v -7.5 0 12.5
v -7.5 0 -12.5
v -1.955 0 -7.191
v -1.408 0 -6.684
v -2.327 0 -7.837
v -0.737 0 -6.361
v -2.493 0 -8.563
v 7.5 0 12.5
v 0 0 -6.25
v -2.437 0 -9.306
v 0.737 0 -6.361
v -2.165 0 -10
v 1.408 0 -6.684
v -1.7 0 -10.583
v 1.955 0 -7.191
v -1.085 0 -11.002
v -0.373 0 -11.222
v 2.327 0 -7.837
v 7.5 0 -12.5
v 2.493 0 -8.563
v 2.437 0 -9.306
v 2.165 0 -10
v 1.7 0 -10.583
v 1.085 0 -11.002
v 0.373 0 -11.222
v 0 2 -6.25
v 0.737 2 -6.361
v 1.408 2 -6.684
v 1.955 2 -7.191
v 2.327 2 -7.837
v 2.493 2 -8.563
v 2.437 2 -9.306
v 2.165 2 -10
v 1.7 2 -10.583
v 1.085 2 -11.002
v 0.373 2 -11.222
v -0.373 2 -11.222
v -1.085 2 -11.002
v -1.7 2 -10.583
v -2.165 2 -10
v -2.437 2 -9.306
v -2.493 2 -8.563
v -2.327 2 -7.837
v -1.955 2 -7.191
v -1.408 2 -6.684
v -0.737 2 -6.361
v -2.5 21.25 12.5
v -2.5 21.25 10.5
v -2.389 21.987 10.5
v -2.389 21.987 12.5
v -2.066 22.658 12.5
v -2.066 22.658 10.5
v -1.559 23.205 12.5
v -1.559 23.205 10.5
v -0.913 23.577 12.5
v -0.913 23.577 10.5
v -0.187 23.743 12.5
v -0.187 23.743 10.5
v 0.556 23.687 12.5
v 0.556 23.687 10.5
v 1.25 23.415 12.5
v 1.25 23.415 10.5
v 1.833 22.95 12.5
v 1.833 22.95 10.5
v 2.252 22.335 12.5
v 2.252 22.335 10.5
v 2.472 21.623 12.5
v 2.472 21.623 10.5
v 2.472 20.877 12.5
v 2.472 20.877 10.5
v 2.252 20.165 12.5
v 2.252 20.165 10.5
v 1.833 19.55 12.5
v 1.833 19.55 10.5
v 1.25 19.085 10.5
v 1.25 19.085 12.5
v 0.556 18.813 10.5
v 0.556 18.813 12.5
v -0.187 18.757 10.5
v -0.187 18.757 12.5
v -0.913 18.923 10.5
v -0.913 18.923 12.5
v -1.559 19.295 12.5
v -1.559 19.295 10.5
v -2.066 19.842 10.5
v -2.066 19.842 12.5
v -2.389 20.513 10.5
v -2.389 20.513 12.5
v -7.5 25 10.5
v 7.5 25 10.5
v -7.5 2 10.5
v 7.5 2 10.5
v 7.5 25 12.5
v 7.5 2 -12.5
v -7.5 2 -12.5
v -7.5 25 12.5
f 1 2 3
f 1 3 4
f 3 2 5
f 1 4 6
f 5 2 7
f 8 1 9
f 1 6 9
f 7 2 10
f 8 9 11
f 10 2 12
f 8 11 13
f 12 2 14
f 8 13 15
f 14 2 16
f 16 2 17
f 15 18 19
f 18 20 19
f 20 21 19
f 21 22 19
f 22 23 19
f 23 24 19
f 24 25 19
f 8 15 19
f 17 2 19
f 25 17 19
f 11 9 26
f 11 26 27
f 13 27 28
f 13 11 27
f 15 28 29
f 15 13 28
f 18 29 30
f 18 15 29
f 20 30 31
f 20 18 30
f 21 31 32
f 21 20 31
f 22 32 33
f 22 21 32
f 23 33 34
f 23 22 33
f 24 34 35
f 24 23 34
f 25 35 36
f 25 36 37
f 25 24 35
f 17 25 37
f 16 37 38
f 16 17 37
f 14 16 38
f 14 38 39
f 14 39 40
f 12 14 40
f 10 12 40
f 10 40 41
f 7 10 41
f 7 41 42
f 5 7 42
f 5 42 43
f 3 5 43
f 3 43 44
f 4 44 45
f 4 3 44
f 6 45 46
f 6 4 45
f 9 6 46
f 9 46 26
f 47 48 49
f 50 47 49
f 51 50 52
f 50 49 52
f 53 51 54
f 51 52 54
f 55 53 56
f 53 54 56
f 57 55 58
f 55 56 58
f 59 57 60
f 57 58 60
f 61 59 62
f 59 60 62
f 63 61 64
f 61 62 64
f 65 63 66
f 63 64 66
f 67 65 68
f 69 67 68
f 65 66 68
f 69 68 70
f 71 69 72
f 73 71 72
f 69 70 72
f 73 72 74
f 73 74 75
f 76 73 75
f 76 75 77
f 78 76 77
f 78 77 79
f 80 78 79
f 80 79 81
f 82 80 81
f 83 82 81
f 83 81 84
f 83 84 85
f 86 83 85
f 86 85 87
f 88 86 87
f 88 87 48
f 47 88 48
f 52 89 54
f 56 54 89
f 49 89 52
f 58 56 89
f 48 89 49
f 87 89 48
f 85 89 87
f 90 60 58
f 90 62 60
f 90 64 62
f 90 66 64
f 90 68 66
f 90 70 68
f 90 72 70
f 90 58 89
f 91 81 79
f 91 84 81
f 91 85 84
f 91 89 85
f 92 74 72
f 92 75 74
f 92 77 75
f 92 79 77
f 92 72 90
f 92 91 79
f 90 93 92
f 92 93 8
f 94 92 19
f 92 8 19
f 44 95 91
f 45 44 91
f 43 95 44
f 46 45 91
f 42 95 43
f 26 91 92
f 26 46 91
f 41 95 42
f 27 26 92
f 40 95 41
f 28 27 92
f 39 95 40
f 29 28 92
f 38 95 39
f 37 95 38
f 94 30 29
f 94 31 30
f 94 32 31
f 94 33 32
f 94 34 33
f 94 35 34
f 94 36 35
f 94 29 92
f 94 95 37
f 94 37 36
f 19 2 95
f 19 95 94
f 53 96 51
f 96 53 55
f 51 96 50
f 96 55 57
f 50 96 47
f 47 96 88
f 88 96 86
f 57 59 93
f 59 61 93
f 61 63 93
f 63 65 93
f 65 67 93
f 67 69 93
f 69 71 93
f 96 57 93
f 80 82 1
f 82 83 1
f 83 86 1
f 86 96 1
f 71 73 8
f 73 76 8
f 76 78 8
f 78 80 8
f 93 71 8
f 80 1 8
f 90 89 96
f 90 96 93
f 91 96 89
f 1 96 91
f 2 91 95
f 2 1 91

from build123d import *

# Parameters (mm, degrees)
IZIM1_W                     = 15
IZIM1_H                     = 25
IZIM1_R                     = 2.5
Y_KSEKLIK_EKSTR_ZYON1_DEPTH = 2
IZIM2_W                     = 15
IZIM2_H                     = 2
Y_KSEKLIK_EKSTR_ZYON2_DEPTH = 23
IZIM3_R                     = 2.5
KES_EKSTR_ZYON1_DEPTH       = 13


with BuildPart() as part:
    # Çizim1 → Yükseklik-Ekstrüzyon1 (new body)
    with BuildSketch(Plane(origin=(0, 0, 0), x_dir=(1, 0, 0), z_dir=(0, 1, 0))):
        Rectangle(IZIM1_W, IZIM1_H)
        with Locations(Location((0, 8.75, 0), (0, 0, 270))):
            Circle(IZIM1_R, mode=Mode.SUBTRACT)
    extrude(amount=Y_KSEKLIK_EKSTR_ZYON1_DEPTH)

    # Çizim2 → Yükseklik-Ekstrüzyon2 (add)
    with BuildSketch(Plane(origin=(0, 2, 0), x_dir=(1, 0, 0), z_dir=(0, 1, 0))):
        with Locations((0, -11.5)):
            Rectangle(IZIM2_W, IZIM2_H)
    extrude(amount=Y_KSEKLIK_EKSTR_ZYON2_DEPTH)

    # Çizim3 → Kes-Ekstrüzyon1 (cut)
    with BuildSketch(Plane(origin=(0, 0, 10.5), x_dir=(-1, 0, 0), z_dir=(0, 0, -1))):
        with Locations((0, 21.25)):
            Circle(IZIM3_R)
    extrude(amount=-KES_EKSTR_ZYON1_DEPTH, mode=Mode.SUBTRACT)


solid = part.part
